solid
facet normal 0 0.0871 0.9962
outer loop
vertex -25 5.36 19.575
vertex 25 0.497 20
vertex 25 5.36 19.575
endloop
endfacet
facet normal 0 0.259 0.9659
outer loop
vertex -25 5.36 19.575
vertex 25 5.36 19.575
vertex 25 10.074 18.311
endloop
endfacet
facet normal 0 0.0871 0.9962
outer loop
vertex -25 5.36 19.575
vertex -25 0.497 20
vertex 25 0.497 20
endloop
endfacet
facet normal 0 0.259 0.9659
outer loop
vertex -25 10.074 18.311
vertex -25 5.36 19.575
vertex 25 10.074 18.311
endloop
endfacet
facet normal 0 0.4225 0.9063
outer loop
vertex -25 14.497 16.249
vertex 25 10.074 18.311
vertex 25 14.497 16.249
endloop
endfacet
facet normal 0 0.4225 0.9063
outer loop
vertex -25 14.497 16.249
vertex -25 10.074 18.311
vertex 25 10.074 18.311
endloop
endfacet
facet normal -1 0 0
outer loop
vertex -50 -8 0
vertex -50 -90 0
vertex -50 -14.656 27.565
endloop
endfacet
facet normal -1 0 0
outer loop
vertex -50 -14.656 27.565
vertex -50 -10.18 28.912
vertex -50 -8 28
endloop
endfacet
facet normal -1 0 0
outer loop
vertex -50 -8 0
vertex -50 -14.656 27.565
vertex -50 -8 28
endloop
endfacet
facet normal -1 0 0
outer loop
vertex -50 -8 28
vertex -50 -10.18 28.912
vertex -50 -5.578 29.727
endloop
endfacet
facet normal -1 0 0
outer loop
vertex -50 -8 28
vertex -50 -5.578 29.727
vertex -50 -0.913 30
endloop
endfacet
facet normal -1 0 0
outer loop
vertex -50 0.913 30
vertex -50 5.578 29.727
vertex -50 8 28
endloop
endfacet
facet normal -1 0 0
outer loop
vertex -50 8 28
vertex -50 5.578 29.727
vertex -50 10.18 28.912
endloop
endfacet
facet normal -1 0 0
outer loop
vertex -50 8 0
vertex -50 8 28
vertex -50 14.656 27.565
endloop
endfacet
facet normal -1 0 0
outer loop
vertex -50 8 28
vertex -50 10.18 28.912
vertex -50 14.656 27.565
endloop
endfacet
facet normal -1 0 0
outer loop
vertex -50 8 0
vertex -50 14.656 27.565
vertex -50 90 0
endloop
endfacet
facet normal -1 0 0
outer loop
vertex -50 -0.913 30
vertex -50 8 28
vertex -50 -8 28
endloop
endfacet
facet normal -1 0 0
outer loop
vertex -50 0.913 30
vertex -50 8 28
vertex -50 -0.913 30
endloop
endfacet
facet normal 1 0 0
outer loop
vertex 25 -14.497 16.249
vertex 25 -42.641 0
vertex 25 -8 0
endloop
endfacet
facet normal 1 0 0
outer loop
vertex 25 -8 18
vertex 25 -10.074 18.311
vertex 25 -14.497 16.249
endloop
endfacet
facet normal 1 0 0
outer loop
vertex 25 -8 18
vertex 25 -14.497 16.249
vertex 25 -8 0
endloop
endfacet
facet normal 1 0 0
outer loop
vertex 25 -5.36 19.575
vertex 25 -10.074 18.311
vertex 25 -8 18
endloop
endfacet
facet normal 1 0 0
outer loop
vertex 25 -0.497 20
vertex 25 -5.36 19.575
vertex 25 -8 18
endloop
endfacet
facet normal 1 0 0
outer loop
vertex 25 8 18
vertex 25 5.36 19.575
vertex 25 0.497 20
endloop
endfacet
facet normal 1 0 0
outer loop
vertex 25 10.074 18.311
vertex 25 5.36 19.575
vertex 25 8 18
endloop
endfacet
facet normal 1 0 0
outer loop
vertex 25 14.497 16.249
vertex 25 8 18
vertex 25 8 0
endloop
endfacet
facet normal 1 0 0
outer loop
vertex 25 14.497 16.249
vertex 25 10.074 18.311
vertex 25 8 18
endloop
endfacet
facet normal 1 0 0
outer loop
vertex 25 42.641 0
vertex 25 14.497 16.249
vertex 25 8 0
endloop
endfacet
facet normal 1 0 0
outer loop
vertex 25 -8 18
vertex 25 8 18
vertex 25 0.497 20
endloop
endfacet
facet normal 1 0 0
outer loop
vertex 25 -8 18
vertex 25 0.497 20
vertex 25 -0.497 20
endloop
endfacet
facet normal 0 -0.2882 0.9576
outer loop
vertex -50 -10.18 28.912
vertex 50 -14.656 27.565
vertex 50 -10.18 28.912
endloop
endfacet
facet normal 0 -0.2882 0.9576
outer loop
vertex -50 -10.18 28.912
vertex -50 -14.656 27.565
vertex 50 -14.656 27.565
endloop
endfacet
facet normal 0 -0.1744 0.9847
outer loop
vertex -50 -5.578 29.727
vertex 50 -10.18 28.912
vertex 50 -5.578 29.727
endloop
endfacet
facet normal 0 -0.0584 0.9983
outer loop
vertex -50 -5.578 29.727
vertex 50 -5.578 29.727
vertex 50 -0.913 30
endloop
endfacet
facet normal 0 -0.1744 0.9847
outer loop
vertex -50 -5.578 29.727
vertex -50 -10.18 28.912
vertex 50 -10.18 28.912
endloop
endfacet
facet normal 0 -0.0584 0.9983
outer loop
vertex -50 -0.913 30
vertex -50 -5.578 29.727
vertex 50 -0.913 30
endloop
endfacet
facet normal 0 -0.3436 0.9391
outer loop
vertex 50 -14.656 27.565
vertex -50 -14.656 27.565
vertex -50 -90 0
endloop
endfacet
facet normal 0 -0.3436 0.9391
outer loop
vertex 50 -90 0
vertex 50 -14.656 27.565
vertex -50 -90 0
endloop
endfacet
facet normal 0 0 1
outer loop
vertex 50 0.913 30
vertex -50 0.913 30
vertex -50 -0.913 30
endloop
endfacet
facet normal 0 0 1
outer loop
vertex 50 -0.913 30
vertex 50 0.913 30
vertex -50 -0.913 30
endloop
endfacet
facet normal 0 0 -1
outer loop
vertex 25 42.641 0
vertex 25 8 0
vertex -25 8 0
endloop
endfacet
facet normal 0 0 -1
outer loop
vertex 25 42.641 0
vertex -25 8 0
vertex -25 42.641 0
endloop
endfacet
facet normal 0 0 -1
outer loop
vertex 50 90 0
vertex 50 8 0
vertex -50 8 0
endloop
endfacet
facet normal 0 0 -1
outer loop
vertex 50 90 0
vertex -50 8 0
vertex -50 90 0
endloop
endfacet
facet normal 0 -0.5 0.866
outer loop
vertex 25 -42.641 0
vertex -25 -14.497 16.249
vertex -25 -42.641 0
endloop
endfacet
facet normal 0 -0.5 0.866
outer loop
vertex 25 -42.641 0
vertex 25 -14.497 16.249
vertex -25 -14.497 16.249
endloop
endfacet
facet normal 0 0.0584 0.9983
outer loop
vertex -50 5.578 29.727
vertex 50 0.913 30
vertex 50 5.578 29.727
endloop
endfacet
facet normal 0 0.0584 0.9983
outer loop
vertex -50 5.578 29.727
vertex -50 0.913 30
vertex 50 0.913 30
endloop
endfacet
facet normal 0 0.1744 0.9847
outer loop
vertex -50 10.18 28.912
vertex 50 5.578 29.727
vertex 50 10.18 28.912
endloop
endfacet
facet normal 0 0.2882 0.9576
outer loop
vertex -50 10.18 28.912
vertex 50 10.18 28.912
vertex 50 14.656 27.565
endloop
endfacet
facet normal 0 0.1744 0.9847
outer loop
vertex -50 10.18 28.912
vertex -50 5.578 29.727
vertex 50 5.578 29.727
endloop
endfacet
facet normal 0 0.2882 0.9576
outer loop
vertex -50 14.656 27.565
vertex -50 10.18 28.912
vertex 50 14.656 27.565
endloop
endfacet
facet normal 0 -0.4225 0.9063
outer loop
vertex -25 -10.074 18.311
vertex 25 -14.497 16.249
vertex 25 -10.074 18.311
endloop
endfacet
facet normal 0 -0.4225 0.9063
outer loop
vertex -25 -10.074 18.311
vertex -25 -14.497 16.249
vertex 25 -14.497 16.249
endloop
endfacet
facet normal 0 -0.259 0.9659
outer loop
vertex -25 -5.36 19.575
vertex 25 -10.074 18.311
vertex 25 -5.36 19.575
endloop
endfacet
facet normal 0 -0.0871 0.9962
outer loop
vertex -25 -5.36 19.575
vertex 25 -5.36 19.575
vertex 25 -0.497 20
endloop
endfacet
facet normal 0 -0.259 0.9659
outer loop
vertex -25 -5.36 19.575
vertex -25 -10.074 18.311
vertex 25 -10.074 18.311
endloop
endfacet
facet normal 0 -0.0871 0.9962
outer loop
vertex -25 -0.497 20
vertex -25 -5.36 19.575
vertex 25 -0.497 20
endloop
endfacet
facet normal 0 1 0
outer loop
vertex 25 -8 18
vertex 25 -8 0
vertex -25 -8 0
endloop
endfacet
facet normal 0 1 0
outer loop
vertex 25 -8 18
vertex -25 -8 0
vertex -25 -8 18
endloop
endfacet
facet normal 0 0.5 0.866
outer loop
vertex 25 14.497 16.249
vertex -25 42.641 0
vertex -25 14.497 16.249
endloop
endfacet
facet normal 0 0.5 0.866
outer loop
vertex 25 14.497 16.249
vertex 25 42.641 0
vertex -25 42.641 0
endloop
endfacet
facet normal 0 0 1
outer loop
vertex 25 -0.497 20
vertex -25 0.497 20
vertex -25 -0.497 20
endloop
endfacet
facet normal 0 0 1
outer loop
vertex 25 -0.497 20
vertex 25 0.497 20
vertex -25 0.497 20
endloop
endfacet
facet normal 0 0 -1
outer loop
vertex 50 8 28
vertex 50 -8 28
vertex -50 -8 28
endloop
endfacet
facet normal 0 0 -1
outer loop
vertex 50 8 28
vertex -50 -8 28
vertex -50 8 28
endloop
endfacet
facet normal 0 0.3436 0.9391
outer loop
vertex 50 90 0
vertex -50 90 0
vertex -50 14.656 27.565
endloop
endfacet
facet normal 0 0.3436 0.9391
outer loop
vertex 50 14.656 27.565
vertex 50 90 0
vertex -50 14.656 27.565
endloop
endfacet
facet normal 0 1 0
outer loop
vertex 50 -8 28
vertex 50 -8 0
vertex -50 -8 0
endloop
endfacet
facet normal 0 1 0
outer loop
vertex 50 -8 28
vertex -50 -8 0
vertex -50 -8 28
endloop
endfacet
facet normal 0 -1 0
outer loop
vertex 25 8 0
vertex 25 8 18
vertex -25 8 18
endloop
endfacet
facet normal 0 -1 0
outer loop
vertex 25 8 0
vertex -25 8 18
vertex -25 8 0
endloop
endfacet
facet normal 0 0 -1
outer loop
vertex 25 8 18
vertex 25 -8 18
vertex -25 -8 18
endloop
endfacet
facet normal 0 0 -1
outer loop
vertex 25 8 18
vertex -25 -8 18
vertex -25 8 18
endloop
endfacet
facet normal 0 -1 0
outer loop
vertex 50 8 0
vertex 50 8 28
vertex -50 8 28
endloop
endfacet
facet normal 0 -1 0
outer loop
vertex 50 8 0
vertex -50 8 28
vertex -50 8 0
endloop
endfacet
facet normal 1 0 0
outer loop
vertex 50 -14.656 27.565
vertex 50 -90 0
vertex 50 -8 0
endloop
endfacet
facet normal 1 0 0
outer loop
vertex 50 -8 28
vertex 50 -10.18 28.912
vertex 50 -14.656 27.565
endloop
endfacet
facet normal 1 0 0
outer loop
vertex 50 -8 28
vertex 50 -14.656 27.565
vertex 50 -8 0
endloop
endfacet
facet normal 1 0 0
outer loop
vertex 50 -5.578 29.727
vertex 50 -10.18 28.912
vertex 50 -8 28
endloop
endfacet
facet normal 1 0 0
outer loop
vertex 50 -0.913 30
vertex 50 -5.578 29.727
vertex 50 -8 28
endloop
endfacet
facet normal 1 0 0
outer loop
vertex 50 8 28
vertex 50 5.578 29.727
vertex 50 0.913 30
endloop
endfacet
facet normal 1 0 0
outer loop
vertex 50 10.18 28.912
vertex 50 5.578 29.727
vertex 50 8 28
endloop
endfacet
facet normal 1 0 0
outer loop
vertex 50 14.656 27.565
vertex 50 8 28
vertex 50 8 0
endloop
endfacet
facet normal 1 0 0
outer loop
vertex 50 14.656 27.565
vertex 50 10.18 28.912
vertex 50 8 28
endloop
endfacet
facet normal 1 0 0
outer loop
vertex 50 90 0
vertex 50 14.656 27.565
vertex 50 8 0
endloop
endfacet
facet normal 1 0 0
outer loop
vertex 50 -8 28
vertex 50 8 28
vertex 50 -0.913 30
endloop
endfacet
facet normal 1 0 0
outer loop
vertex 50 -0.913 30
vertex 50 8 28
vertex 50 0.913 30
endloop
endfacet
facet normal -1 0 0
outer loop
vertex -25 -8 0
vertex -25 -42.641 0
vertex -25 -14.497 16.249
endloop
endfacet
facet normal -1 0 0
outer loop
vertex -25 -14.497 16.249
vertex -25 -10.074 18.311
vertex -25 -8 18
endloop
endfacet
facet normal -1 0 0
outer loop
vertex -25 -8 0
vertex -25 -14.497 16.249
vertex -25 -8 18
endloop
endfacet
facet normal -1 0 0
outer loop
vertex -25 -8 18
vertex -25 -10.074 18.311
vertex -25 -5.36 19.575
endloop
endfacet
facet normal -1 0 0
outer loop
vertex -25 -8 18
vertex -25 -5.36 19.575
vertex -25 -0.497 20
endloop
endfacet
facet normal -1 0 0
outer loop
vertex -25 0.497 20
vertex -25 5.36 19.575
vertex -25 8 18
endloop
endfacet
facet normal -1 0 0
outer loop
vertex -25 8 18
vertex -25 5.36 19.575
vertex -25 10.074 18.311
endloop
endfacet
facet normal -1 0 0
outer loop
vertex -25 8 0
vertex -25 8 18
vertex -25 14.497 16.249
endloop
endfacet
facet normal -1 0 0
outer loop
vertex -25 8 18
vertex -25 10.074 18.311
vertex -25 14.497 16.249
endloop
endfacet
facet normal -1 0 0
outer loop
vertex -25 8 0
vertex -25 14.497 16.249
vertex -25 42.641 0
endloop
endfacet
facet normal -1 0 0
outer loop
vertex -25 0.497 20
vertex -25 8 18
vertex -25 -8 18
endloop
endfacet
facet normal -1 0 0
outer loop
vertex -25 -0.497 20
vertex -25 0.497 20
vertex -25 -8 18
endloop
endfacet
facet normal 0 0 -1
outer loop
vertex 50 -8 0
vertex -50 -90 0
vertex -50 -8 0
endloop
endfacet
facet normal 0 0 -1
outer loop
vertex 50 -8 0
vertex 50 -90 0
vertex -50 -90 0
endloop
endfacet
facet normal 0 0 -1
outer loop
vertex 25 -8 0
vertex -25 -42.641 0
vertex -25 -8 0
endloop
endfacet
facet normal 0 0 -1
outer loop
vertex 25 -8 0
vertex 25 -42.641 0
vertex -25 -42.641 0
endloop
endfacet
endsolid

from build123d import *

# Parameters (mm, degrees)
PAD_DEPTH    = 25
FILLET_R     = 28
PAD001_DEPTH = 50
FILLET001_R  = 40


with BuildPart() as f_30deg:
    # Sketch → Pad (new body, symmetric)
    with BuildSketch(Plane.YZ):
        Polygon((-42.641016, 0), (-8, 0), (-8, 18), (8, 18), (8, 0), (42.641016, 0), (8, 20), (-8, 20), align=None)
    extrude(amount=PAD_DEPTH, both=True)

    # Fillet
    fillet_edges = [f_30deg.edges().sort_by_distance(p)[0] for p in [
        (0, -8, 20),
        (0, 8, 20),
    ]]
    fillet(fillet_edges, radius=FILLET_R)


with BuildPart() as f_15deg:
    # Sketch001 → Pad001 (new body, symmetric)
    with BuildSketch(Plane.YZ):
        Polygon((-90, 0), (-8, 0), (-8, 28), (8, 28), (8, 0), (90, 0), (8, 30), (-8, 30), align=None)
    extrude(amount=PAD001_DEPTH, both=True)

    # Fillet001
    fillet001_edges = [f_15deg.edges().sort_by_distance(p)[0] for p in [
        (0, -8, 30),
        (0, 8, 30),
    ]]
    fillet(fillet001_edges, radius=FILLET001_R)


solid = Compound([f_30deg.part, f_15deg.part])
